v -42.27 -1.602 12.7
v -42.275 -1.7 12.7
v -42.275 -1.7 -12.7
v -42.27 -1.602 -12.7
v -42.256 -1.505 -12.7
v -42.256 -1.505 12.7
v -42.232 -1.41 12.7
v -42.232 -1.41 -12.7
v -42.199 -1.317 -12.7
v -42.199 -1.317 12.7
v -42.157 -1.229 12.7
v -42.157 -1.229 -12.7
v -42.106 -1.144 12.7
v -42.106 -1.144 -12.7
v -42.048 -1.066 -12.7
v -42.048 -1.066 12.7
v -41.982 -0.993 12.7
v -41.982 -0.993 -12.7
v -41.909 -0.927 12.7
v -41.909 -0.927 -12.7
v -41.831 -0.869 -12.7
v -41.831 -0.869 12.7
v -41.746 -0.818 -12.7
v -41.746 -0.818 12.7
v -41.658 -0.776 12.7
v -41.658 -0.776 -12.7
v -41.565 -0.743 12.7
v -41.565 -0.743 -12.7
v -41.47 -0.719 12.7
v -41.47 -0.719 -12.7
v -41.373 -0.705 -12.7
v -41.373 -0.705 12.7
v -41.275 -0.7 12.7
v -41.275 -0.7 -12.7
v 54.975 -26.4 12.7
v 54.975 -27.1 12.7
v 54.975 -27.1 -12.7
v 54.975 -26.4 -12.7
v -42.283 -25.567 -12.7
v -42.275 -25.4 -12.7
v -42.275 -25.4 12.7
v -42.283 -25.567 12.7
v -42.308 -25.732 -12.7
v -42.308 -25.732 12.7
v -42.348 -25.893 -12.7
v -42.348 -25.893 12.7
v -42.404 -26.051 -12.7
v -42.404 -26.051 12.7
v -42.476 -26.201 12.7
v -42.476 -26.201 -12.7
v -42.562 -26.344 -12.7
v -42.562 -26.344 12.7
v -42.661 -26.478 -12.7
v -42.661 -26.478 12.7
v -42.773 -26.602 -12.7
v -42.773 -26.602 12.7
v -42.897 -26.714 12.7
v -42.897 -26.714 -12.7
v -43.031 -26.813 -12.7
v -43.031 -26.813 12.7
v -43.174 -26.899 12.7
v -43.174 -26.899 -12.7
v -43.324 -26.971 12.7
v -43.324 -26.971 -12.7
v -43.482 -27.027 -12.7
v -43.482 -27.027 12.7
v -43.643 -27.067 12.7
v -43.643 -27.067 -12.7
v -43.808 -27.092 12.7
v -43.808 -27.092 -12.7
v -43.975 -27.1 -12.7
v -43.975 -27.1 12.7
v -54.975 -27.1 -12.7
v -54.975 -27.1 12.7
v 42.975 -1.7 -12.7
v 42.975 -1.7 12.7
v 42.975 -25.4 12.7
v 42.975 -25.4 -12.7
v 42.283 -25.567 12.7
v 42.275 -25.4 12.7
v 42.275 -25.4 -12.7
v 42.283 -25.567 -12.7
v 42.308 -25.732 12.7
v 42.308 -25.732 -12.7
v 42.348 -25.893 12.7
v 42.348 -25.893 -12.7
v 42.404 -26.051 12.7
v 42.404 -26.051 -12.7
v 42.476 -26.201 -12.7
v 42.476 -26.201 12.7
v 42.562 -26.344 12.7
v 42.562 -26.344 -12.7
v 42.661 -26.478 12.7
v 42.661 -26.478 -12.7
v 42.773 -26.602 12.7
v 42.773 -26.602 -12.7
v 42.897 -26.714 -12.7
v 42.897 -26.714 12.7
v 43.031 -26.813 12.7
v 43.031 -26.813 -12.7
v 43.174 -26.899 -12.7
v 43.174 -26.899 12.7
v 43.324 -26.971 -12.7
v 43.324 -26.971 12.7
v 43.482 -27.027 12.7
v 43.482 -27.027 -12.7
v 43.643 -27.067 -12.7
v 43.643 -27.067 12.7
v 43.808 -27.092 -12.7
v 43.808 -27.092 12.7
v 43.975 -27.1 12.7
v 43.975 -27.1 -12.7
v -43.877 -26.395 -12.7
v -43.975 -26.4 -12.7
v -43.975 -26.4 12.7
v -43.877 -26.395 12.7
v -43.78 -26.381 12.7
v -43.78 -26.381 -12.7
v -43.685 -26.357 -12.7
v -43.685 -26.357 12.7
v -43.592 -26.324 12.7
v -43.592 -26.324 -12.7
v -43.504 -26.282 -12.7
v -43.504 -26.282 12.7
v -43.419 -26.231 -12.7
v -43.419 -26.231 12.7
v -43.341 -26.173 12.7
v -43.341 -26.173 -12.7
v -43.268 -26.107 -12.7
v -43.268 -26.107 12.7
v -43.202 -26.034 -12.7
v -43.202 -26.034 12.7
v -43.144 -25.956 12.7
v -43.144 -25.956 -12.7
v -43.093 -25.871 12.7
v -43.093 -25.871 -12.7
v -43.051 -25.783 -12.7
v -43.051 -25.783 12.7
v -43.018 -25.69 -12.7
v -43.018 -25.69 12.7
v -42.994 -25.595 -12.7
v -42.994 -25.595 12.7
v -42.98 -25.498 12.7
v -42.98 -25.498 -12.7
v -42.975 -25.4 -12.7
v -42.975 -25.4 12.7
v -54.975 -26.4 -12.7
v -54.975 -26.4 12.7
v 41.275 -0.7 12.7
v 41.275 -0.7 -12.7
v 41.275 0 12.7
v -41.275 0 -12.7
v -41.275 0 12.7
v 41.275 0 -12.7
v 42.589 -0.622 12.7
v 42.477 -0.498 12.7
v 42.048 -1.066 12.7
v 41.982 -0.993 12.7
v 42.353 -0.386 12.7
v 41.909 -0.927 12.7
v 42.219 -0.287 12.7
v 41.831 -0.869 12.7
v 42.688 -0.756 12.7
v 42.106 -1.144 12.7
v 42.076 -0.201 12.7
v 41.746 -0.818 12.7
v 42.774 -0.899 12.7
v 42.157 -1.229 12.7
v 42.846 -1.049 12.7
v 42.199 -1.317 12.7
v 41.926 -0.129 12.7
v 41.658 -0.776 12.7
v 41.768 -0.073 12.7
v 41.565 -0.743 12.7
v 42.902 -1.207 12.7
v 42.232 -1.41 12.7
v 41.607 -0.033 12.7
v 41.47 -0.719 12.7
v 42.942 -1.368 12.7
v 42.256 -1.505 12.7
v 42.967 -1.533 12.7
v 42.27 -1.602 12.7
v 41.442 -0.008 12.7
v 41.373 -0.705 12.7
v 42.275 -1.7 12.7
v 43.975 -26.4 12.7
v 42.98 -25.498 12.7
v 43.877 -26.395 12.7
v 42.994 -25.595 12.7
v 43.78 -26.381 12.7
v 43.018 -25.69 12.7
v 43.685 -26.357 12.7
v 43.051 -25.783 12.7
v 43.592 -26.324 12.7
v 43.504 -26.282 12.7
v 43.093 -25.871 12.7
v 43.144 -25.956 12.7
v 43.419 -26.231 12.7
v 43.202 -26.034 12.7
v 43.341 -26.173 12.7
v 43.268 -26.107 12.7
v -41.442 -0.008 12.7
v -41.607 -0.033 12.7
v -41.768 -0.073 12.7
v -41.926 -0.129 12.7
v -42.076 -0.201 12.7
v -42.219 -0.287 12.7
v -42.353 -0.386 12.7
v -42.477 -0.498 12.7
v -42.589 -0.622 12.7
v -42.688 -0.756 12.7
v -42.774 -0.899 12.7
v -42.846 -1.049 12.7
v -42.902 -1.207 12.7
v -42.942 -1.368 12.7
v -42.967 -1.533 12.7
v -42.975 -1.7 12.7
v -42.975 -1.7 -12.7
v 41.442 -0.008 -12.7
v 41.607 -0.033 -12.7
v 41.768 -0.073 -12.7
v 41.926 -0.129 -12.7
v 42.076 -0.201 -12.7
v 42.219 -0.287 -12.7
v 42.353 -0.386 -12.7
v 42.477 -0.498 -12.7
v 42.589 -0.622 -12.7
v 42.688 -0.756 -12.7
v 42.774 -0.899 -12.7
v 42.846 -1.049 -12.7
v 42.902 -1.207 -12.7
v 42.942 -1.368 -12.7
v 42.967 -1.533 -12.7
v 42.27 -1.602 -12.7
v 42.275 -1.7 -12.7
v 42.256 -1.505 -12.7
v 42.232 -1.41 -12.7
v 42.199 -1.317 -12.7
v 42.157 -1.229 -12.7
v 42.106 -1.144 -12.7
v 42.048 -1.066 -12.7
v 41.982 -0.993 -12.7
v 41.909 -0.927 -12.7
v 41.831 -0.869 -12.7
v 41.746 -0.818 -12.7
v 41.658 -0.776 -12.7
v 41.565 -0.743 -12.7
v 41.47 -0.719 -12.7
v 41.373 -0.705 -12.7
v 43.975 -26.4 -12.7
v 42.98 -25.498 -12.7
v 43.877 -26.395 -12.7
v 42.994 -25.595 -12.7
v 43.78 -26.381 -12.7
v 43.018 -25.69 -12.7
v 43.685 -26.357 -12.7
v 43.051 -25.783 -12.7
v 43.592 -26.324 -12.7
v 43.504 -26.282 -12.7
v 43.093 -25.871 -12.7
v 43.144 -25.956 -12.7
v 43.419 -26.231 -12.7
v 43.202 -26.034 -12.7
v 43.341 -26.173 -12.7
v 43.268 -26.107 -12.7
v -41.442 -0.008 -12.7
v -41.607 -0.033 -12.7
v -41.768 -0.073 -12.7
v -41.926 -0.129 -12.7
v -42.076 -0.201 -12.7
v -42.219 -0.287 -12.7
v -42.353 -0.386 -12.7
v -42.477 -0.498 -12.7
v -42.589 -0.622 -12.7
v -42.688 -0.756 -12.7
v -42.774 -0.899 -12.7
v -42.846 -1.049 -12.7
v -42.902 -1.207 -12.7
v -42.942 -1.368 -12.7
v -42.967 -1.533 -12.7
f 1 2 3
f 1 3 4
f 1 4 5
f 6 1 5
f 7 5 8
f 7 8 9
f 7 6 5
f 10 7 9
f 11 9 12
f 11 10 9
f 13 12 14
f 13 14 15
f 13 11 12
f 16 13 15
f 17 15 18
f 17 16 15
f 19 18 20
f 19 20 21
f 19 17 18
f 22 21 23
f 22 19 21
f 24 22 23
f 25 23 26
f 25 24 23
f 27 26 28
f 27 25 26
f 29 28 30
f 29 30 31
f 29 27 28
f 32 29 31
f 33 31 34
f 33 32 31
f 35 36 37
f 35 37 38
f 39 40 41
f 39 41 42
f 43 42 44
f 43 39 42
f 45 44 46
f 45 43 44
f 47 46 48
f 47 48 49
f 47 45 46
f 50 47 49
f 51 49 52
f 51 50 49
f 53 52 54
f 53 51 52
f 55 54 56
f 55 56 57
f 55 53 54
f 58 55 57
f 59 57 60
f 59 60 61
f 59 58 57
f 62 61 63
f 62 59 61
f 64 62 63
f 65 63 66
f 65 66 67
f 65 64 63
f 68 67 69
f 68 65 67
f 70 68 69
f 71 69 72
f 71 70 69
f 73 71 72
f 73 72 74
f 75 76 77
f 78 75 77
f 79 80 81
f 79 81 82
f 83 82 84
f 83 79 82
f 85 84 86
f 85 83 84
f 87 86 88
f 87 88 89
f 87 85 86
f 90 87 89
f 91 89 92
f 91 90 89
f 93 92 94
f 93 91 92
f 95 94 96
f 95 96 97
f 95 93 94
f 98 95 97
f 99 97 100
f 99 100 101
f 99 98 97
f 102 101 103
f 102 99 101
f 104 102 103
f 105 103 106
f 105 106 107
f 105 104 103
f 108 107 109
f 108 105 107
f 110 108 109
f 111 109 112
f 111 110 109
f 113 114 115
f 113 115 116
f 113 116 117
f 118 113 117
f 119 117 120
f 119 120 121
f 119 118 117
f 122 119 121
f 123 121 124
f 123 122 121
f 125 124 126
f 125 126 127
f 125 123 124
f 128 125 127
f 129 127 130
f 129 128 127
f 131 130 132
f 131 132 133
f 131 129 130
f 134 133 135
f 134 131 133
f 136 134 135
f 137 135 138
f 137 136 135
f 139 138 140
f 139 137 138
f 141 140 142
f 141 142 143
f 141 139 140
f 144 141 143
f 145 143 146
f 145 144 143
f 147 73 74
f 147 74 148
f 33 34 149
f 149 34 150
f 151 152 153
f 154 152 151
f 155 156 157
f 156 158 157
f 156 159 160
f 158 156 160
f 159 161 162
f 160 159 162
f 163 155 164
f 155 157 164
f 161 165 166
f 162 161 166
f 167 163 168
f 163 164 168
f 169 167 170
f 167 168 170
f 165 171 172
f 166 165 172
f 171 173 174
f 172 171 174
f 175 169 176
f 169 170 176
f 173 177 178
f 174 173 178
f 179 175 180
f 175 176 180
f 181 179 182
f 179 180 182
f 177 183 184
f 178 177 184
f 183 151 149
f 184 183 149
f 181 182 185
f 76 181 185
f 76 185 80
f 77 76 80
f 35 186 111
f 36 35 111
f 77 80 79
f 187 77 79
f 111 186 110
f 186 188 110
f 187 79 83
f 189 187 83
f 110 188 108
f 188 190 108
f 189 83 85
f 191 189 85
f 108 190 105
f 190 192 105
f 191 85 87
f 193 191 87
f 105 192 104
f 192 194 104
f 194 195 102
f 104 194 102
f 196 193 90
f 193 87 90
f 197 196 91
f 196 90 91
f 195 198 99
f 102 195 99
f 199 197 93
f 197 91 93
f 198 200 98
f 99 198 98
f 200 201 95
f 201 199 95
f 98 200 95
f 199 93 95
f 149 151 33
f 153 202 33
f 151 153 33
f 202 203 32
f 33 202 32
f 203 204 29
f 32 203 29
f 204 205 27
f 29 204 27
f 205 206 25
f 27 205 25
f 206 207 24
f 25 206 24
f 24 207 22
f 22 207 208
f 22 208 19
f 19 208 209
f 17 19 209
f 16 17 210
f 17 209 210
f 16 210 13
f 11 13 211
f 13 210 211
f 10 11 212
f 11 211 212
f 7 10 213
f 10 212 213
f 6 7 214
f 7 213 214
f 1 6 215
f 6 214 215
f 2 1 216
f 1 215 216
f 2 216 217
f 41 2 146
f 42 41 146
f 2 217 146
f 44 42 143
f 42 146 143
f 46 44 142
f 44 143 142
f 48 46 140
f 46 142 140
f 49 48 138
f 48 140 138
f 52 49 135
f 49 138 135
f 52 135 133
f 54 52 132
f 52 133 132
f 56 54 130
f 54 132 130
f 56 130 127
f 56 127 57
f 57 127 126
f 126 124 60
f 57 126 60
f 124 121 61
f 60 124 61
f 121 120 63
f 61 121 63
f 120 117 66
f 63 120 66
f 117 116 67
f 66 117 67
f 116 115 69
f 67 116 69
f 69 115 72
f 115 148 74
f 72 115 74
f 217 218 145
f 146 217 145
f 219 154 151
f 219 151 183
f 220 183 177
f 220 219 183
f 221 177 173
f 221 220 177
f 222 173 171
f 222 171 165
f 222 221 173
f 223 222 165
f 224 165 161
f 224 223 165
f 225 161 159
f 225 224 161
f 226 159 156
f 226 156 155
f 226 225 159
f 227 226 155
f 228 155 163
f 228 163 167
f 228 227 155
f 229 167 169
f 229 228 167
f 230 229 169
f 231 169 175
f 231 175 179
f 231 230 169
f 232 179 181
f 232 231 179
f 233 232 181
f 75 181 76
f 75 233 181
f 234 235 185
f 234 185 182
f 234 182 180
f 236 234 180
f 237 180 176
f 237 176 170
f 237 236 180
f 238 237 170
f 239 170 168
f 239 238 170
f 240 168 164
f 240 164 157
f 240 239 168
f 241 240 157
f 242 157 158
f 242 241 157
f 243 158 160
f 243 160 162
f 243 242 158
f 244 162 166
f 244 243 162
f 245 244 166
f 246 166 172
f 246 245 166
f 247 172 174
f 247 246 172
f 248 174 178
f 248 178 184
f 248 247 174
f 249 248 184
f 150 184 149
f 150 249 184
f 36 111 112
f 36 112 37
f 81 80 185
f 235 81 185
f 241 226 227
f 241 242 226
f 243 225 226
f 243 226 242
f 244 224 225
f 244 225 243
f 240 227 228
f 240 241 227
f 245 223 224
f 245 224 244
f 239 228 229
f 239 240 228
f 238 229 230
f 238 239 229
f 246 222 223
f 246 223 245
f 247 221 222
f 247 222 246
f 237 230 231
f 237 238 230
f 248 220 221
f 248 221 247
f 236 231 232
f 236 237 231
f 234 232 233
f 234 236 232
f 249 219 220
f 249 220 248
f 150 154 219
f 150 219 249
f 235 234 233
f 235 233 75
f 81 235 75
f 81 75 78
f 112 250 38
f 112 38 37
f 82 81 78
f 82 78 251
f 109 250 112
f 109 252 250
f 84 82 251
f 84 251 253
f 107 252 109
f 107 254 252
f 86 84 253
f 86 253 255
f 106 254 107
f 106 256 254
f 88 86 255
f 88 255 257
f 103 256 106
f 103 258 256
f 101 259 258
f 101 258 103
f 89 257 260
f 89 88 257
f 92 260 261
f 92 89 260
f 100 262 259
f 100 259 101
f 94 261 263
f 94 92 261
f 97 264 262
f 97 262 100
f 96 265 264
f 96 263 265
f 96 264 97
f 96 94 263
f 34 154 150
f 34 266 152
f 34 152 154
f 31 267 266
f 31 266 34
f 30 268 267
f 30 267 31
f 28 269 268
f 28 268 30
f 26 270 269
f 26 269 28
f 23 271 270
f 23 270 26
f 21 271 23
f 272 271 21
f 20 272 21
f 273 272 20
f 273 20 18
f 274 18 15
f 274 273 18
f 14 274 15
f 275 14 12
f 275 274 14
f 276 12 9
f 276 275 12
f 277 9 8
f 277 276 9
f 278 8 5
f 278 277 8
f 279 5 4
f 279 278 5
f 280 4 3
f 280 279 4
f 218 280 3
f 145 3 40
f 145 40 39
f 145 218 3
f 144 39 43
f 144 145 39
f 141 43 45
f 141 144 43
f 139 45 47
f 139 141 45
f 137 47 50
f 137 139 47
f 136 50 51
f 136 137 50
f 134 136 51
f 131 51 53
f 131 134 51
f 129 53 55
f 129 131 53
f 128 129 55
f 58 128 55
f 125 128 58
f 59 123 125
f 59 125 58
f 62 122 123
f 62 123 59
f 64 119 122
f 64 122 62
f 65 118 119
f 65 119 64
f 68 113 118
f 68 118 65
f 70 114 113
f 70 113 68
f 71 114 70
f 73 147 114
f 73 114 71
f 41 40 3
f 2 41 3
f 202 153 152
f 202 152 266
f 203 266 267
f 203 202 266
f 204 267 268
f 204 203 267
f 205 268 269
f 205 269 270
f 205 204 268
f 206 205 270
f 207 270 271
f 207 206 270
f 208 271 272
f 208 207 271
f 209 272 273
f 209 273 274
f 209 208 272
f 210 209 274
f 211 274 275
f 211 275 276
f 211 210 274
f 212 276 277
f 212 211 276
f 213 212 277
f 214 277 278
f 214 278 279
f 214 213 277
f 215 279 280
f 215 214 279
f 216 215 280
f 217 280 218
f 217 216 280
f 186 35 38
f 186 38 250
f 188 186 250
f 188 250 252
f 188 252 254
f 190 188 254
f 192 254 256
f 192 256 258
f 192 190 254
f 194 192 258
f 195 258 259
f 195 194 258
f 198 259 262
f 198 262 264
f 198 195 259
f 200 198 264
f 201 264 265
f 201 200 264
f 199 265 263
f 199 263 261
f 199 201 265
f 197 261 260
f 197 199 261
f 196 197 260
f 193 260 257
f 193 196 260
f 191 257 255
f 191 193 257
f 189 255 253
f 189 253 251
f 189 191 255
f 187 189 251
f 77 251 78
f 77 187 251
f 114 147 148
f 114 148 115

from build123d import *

# Parameters (mm, degrees)
SKETCH1_W          = 82.55
SKETCH1_H          = 25.4
BASE_FLANGE1_DEPTH = 0.7
EDGE_FLANGE1_DEPTH = 25.4
EDGE_FLANGE2_DEPTH = 25.4
EDGE_FLANGE3_DEPTH = 25.4
EDGE_FLANGE4_DEPTH = 25.4


# Sheet-metal steps are written as plain solids
with BuildPart() as part:
    # Sketch1 → Base-Flange1 (new body)
    with BuildSketch(Plane(origin=(0, 0, 0), x_dir=(1, 0, 0), z_dir=(0, 1, 0))):
        Rectangle(SKETCH1_W, SKETCH1_H)
    extrude(amount=-BASE_FLANGE1_DEPTH)

    # Edge-Flange1 section (across the edge) → Edge-Flange1 (add)
    with BuildSketch(Plane(origin=(42.275, -0.7, -12.7), x_dir=(-1, 0, 0), z_dir=(0, 0, 1))):
        with BuildLine():
            Line((-0.7, 1), (-0.7, 24.7))
            Line((-0.7, 24.7), (0, 24.7))
            Line((0, 24.7), (0, 1))
            ThreePointArc((0, 1), (0.292893219, 0.292893219), (1, 0))
            Line((1, 0), (1, -0.7))
            ThreePointArc((1, -0.7), (-0.202081528, -0.202081528), (-0.7, 1))
        make_face()
    extrude(amount=EDGE_FLANGE1_DEPTH)

    # Edge-Flange2 section (across the edge) → Edge-Flange2 (add)
    with BuildSketch(Plane(origin=(42.975, -26.4, 12.7), x_dir=(0, 1, 0), z_dir=(0, 0, -1))):
        with BuildLine():
            Line((-0.7, 1), (-0.7, 12))
            Line((-0.7, 12), (0, 12))
            Line((0, 12), (0, 1))
            ThreePointArc((0, 1), (0.292893219, 0.292893219), (1, 0))
            Line((1, 0), (1, -0.7))
            ThreePointArc((1, -0.7), (-0.202081528, -0.202081528), (-0.7, 1))
        make_face()
    extrude(amount=EDGE_FLANGE2_DEPTH)

    # Edge-Flange3 section (across the edge) → Edge-Flange3 (add)
    with BuildSketch(Plane(origin=(-42.275, -0.7, 12.7), x_dir=(1, 0, 0), z_dir=(0, 0, -1))):
        with BuildLine():
            Line((-0.7, 1), (-0.7, 24.7))
            Line((-0.7, 24.7), (0, 24.7))
            Line((0, 24.7), (0, 1))
            ThreePointArc((0, 1), (0.292893219, 0.292893219), (1, 0))
            Line((1, 0), (1, -0.7))
            ThreePointArc((1, -0.7), (-0.202081528, -0.202081528), (-0.7, 1))
        make_face()
    extrude(amount=EDGE_FLANGE3_DEPTH)

    # Edge-Flange4 section (across the edge) → Edge-Flange4 (add)
    with BuildSketch(Plane(origin=(-42.975, -26.4, -12.7), x_dir=(0, 1, 0), z_dir=(0, 0, 1))):
        with BuildLine():
            Line((-0.7, 1), (-0.7, 12))
            Line((-0.7, 12), (0, 12))
            Line((0, 12), (0, 1))
            ThreePointArc((0, 1), (0.292893219, 0.292893219), (1, 0))
            Line((1, 0), (1, -0.7))
            ThreePointArc((1, -0.7), (-0.202081528, -0.202081528), (-0.7, 1))
        make_face()
    extrude(amount=EDGE_FLANGE4_DEPTH)


solid = part.part
